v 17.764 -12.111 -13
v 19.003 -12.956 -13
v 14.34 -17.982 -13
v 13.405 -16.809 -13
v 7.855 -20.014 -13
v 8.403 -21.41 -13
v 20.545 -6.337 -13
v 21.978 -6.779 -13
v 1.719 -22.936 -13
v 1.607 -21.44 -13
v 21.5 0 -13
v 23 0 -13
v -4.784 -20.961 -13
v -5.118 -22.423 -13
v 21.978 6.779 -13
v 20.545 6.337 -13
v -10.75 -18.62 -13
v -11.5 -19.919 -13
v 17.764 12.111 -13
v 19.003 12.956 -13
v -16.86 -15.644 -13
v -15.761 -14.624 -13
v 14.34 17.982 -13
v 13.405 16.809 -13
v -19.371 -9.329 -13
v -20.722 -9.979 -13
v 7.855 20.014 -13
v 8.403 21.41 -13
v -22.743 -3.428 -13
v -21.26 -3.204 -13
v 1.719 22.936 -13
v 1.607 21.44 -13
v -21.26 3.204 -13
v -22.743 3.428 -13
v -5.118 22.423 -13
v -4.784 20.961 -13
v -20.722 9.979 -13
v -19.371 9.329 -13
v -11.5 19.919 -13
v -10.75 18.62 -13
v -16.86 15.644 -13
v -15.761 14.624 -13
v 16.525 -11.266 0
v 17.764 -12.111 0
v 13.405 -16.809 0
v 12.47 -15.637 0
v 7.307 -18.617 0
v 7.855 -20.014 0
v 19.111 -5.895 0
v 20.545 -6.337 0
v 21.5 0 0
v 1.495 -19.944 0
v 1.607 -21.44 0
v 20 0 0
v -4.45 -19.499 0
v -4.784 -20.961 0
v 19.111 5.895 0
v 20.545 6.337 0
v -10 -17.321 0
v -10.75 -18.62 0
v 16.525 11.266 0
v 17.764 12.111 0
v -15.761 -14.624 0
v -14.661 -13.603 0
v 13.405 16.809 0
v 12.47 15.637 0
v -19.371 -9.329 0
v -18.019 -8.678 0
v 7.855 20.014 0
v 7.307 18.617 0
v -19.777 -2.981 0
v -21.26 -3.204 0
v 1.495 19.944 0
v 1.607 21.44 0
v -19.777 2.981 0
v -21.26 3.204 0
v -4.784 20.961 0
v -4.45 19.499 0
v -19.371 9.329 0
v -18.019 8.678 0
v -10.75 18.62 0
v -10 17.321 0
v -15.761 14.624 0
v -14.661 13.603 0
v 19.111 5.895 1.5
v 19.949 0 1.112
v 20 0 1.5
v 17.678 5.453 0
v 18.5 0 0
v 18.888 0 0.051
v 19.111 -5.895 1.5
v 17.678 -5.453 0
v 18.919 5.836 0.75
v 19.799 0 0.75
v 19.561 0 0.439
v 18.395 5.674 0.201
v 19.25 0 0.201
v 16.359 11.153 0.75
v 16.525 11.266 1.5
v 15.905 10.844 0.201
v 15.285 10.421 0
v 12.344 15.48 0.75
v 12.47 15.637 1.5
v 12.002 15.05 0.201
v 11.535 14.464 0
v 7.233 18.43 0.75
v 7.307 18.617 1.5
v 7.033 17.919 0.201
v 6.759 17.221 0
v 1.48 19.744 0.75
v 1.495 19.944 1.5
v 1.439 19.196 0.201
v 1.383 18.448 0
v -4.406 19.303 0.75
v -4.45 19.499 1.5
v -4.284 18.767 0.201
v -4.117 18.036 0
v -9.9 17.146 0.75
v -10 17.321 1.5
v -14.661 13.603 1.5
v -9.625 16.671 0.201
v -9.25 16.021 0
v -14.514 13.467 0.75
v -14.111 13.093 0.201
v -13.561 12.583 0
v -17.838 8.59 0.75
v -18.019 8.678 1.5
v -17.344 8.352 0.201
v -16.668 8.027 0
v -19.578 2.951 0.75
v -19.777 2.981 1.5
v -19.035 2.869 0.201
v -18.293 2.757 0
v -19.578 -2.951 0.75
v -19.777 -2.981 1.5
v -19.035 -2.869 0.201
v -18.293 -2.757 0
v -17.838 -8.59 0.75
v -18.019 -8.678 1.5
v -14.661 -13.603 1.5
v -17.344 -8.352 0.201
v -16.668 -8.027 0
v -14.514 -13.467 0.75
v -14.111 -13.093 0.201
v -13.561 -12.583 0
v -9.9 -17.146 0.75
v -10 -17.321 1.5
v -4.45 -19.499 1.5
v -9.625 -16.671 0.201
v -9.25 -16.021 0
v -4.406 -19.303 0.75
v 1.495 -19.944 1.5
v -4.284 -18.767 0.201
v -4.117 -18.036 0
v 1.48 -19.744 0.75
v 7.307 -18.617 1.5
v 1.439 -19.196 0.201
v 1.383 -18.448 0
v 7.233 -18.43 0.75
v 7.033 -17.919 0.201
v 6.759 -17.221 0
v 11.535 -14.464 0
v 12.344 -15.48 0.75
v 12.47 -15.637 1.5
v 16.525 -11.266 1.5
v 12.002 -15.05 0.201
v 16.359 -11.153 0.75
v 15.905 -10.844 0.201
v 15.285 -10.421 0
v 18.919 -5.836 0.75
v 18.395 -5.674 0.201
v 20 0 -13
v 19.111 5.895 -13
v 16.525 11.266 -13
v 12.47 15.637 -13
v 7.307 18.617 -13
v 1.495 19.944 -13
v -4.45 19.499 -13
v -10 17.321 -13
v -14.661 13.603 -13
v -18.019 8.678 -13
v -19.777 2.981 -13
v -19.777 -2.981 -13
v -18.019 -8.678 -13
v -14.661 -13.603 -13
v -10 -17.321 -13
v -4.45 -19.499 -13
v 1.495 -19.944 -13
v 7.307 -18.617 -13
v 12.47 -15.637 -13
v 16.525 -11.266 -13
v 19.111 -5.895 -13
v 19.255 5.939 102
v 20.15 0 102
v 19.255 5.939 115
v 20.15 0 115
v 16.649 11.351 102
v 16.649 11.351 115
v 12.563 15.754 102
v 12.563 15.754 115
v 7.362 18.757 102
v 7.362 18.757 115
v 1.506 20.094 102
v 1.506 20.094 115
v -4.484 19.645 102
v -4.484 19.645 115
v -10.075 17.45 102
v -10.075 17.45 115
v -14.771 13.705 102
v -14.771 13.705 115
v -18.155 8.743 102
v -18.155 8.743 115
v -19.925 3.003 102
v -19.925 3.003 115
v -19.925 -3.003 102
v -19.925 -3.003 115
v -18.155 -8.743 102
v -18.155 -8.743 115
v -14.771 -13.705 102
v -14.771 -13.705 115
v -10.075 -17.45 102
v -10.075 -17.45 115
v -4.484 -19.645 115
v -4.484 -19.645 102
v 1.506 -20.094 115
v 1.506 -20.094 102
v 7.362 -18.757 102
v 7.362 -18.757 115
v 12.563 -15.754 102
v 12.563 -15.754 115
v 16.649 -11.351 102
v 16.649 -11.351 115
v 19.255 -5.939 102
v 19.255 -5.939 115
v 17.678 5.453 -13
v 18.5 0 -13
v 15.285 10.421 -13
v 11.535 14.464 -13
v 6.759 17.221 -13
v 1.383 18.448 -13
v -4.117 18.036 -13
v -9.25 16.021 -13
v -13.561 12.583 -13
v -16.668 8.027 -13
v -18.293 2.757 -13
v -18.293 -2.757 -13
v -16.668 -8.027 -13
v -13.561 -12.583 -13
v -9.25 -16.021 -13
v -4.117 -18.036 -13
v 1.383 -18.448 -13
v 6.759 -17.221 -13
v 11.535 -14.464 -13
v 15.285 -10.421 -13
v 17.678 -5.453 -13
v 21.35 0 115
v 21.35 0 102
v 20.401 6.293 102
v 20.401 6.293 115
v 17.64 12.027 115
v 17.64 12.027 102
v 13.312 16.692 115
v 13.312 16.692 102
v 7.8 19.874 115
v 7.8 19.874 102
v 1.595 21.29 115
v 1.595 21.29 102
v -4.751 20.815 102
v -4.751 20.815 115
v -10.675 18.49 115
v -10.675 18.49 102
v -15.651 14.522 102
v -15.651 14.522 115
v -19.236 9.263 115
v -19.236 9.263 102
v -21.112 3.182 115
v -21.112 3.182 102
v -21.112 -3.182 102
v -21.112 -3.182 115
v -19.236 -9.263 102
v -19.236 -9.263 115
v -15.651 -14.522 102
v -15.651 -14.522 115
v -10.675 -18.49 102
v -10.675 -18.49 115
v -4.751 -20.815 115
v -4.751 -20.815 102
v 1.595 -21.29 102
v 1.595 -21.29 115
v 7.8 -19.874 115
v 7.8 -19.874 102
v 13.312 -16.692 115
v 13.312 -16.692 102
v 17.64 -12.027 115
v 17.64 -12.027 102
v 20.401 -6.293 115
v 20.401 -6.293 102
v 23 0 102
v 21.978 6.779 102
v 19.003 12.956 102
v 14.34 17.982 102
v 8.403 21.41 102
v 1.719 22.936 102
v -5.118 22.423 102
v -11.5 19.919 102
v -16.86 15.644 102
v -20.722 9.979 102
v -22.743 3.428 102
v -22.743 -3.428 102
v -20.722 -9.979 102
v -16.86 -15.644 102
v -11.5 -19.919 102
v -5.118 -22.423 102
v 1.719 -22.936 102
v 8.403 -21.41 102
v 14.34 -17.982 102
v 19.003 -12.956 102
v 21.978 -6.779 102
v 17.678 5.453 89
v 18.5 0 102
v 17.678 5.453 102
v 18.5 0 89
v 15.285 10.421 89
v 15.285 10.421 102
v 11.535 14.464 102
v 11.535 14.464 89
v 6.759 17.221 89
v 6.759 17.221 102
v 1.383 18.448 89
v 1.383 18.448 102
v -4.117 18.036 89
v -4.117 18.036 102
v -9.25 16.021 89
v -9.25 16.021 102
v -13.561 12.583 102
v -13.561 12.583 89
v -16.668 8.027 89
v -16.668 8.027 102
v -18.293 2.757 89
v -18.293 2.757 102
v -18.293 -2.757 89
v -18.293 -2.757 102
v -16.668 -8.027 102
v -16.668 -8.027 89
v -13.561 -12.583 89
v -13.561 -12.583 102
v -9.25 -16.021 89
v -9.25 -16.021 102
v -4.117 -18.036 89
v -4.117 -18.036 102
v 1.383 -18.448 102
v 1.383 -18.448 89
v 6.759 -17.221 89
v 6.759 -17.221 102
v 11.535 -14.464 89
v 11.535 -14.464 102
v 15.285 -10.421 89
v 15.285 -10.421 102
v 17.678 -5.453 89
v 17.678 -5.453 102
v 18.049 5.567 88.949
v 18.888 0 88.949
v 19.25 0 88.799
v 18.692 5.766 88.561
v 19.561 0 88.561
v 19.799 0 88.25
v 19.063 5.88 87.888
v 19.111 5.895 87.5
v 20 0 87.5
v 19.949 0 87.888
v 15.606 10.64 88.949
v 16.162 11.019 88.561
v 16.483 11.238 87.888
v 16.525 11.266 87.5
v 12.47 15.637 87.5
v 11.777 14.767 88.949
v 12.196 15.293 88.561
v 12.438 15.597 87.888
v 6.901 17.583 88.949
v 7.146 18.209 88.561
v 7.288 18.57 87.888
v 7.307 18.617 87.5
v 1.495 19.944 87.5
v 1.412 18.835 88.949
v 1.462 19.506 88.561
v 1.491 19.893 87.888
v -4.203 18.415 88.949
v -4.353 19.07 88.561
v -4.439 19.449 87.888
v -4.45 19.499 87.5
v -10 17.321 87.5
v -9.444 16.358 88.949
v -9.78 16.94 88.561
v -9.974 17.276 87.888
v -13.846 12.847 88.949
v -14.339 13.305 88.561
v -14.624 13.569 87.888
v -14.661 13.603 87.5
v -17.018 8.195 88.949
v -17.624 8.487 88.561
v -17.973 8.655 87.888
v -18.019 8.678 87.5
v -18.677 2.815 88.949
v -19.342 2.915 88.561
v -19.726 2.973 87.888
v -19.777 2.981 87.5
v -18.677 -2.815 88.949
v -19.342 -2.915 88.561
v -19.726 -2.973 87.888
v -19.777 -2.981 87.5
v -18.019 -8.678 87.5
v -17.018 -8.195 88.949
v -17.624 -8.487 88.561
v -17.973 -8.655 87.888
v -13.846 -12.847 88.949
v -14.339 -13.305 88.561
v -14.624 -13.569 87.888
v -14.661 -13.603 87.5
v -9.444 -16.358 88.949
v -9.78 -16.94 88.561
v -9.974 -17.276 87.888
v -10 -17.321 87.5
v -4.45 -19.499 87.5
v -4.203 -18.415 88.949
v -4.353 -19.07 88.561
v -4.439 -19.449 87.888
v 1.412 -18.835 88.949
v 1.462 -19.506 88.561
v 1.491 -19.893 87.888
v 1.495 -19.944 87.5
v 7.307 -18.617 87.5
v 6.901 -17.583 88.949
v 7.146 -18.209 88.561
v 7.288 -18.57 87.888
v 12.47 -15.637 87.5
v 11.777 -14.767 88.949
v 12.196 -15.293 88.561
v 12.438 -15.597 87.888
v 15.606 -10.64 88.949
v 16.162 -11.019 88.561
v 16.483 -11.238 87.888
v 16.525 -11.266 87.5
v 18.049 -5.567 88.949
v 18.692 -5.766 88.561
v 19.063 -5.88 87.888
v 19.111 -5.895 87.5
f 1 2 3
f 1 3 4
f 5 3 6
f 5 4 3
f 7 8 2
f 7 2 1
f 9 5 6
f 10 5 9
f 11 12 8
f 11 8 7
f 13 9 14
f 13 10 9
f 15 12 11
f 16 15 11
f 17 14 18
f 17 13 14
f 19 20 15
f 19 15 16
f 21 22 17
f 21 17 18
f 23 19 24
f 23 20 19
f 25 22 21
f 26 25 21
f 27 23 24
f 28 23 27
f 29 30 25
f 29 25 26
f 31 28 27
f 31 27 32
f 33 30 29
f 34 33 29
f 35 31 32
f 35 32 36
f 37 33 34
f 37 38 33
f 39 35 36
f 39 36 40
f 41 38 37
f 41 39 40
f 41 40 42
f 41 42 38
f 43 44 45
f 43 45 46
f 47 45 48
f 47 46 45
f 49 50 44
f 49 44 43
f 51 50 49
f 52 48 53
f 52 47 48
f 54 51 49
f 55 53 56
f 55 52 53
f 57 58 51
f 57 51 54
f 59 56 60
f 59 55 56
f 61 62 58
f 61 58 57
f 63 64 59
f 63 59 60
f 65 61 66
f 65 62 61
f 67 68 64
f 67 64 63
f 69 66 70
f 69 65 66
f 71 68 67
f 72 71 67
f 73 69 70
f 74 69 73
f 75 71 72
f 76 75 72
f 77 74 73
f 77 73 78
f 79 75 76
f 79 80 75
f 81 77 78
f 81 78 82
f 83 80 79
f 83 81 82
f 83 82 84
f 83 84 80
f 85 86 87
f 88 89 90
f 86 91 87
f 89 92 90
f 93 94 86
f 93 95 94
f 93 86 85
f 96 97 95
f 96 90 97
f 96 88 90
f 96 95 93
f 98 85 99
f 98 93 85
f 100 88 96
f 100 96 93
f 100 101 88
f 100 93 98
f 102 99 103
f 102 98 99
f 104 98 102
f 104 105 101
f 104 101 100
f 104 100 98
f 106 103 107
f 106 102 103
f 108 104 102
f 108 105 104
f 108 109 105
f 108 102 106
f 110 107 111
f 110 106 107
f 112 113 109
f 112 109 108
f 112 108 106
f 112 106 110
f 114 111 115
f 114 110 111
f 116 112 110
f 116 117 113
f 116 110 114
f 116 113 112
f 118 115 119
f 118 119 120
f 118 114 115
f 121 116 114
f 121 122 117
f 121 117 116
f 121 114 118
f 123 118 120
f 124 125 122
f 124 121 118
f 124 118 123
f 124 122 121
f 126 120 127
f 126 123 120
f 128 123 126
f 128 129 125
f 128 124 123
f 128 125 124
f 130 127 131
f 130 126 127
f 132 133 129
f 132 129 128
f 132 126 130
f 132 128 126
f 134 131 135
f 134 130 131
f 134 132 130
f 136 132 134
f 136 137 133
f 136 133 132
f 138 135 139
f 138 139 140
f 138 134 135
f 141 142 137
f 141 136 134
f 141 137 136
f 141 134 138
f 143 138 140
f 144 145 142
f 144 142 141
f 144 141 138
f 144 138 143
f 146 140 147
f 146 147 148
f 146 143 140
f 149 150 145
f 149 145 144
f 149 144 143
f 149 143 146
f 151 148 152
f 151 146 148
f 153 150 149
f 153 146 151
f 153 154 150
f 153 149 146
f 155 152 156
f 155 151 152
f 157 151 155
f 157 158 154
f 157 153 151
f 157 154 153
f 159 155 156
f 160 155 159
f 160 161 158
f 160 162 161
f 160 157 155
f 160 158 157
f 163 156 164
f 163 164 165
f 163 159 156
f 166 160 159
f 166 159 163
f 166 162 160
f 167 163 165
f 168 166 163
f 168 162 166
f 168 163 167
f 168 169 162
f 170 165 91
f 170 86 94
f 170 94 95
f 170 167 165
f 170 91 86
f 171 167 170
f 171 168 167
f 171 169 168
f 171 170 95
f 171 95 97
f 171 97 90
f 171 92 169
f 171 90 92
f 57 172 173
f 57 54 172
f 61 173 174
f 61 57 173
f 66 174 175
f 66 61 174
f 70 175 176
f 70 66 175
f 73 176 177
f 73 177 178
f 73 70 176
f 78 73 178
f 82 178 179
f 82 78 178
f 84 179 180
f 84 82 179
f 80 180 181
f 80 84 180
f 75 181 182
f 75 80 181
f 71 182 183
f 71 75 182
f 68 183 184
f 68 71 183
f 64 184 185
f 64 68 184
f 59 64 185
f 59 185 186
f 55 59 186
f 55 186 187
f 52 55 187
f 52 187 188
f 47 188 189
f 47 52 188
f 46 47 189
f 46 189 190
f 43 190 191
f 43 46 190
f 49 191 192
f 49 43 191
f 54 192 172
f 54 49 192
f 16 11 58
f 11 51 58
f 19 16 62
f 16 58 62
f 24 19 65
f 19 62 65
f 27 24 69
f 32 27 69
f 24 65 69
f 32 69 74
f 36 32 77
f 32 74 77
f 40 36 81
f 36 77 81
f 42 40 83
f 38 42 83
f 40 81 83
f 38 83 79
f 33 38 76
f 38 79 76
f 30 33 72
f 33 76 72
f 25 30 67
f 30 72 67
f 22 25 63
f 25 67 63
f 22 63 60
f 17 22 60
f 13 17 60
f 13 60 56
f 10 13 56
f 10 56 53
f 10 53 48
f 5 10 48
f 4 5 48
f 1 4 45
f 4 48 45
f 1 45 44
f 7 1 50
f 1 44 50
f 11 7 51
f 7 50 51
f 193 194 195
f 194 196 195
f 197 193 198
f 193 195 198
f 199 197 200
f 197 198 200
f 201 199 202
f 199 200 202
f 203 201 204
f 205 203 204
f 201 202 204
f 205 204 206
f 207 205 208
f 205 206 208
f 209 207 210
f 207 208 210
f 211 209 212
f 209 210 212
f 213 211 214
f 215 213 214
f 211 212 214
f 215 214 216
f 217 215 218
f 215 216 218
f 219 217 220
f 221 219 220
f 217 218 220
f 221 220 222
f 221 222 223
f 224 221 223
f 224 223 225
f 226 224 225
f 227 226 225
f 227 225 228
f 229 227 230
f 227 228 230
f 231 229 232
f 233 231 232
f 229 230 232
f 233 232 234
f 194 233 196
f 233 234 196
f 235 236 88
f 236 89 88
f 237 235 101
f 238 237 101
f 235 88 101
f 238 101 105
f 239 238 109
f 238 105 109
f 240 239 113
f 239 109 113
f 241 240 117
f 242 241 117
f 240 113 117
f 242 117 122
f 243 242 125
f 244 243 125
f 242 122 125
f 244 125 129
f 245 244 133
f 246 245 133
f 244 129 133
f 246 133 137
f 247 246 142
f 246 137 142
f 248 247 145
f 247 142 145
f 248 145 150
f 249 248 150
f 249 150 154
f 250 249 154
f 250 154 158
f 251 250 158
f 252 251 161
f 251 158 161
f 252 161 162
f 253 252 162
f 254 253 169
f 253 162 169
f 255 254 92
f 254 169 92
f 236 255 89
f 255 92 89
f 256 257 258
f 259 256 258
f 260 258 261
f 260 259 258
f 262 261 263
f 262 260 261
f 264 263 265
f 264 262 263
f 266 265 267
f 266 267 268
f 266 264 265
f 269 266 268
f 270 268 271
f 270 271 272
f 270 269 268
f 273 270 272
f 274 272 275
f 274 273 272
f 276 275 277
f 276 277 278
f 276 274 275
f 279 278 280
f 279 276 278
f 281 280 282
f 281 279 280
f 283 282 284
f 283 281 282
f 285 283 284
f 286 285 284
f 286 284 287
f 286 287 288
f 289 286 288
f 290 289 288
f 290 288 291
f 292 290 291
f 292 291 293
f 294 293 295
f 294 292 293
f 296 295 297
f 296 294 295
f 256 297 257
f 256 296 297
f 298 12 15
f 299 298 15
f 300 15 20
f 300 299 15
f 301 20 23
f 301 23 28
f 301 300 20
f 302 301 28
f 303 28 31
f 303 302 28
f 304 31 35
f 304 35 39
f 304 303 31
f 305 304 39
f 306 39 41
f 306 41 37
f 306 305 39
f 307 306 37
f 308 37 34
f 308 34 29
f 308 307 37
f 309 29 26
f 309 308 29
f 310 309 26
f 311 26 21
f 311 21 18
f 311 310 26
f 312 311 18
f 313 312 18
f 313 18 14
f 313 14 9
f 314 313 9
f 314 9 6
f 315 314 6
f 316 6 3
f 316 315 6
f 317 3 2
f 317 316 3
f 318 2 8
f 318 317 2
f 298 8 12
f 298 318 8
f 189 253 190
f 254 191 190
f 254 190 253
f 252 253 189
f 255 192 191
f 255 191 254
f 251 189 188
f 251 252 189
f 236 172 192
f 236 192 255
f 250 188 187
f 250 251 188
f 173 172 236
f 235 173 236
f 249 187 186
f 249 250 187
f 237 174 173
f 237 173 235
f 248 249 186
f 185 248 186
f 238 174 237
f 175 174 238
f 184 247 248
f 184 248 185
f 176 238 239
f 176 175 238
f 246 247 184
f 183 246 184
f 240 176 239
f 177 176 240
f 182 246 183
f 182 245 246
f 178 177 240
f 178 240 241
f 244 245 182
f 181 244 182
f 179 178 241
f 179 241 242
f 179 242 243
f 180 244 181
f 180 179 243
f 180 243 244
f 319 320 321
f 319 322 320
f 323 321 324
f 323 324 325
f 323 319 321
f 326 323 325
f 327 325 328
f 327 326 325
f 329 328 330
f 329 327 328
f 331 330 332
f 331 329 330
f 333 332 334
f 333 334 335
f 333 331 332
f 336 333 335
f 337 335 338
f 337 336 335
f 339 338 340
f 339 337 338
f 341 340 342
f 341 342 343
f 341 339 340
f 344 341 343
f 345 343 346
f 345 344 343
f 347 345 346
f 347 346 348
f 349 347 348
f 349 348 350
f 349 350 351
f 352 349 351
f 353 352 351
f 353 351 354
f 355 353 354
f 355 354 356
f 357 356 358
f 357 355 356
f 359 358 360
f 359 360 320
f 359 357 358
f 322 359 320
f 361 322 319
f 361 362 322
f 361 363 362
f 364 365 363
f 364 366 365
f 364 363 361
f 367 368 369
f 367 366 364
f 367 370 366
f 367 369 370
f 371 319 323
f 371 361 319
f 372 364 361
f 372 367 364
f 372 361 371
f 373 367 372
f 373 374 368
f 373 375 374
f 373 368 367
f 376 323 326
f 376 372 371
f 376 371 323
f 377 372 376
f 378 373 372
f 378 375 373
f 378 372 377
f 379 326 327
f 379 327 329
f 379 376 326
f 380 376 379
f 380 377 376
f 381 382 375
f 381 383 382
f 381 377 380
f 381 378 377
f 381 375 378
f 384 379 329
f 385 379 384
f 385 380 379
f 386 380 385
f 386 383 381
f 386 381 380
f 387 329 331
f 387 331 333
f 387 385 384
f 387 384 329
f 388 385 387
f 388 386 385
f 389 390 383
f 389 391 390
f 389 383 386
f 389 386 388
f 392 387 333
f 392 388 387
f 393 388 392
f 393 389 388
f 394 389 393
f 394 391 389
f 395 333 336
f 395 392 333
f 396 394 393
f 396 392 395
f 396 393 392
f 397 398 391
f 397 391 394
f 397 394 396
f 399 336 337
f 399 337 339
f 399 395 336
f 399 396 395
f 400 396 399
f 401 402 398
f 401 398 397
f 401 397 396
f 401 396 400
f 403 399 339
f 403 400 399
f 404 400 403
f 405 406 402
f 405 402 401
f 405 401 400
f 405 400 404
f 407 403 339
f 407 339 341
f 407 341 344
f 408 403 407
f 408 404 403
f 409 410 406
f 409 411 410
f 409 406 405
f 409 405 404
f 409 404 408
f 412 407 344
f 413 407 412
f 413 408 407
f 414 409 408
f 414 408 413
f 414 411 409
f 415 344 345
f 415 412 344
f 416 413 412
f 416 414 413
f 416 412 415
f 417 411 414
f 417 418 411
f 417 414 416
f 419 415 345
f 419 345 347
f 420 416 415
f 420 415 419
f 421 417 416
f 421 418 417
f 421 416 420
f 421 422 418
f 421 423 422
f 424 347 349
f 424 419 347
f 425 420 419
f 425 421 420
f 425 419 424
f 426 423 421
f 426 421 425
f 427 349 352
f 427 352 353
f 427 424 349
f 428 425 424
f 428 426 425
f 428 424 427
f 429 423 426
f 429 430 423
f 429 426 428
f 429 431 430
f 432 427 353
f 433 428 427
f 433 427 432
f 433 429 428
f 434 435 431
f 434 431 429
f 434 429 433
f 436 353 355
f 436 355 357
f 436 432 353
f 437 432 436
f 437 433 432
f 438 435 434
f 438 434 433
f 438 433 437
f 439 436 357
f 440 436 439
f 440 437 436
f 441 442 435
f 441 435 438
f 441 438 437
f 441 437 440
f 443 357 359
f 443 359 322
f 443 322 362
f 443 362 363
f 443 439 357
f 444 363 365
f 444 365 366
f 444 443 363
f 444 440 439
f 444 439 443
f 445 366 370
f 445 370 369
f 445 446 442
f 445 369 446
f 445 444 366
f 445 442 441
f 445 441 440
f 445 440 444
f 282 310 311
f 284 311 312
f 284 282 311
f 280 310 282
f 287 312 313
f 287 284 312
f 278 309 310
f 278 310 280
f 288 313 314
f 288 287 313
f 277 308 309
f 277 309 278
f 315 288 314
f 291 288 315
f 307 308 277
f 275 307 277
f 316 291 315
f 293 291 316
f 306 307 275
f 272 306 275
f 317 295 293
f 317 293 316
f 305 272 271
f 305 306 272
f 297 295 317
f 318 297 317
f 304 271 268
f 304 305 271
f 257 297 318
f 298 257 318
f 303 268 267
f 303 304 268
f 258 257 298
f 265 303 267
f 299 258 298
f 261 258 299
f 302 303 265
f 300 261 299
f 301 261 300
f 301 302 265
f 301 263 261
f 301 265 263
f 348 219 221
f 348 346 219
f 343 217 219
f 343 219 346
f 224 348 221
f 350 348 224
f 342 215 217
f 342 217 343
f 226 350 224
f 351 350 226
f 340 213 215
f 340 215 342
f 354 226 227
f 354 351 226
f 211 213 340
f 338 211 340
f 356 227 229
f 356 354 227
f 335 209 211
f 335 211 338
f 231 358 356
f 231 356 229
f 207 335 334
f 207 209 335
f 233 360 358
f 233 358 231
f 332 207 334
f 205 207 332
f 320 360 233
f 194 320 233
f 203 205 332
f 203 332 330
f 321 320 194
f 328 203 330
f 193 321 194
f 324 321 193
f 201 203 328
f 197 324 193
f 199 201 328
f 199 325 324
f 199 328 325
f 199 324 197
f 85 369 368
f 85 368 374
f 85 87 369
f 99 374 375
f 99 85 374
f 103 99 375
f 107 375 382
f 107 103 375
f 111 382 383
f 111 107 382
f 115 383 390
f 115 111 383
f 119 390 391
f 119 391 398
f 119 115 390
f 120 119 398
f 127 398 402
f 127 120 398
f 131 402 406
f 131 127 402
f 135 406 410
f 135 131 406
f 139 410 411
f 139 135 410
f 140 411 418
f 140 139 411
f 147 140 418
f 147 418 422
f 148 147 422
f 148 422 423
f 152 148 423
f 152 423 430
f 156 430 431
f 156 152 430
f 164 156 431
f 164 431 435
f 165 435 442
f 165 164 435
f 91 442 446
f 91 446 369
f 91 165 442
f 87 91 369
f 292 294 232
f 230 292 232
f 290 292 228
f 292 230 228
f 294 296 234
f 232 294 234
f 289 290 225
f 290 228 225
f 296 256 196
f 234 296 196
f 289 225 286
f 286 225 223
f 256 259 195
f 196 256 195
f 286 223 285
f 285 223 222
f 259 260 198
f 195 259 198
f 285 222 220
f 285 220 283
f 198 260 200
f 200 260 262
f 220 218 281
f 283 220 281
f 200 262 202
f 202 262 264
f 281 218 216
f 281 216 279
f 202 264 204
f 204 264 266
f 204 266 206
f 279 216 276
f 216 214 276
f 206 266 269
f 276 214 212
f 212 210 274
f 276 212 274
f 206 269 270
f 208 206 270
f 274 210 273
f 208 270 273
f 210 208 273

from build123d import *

# Parameters (mm, degrees)
F0_W   = 1.5
F0_H   = 13
F0_W_2 = 1.2


with BuildPart() as f1:
    # F0 (on Front) → F1 (revolve)
    with BuildSketch(Plane.XZ):
        with BuildLine():
            Line((20, 87.5), (20, 44.5))
            Line((20, 44.5), (23, 44.5))
            Line((23, 44.5), (23, 102))
            Line((23, 102), (21.35, 102))
            Line((21.35, 102), (20.15, 102))
            Line((20.15, 102), (18.5, 102))
            Line((18.5, 102), (18.5, 89))
            ThreePointArc((18.5, 89), (19.56066, 88.56066), (20, 87.5))
        make_face()
        Polygon((20, 1.5), (20, 0), (21.5, 0), (23, 0), (23, 44.5), (20, 44.5), align=None)
        with Locations((22.25, -6.5)):
            Rectangle(F0_W, F0_H)
        with Locations((19.25, -6.5)):
            Rectangle(F0_W, F0_H)
        with BuildLine():
            ThreePointArc((20, 1.5), (19.56066, 0.43934), (18.5, 0))
            Line((18.5, 0), (20, 0))
            Line((20, 0), (20, 1.5))
        make_face()
        with Locations((20.75, 108.5)):
            Rectangle(F0_W_2, F0_H)
    revolve(axis=Axis((0, 0, 51), (0, 0, 1)))


solid = f1.part
